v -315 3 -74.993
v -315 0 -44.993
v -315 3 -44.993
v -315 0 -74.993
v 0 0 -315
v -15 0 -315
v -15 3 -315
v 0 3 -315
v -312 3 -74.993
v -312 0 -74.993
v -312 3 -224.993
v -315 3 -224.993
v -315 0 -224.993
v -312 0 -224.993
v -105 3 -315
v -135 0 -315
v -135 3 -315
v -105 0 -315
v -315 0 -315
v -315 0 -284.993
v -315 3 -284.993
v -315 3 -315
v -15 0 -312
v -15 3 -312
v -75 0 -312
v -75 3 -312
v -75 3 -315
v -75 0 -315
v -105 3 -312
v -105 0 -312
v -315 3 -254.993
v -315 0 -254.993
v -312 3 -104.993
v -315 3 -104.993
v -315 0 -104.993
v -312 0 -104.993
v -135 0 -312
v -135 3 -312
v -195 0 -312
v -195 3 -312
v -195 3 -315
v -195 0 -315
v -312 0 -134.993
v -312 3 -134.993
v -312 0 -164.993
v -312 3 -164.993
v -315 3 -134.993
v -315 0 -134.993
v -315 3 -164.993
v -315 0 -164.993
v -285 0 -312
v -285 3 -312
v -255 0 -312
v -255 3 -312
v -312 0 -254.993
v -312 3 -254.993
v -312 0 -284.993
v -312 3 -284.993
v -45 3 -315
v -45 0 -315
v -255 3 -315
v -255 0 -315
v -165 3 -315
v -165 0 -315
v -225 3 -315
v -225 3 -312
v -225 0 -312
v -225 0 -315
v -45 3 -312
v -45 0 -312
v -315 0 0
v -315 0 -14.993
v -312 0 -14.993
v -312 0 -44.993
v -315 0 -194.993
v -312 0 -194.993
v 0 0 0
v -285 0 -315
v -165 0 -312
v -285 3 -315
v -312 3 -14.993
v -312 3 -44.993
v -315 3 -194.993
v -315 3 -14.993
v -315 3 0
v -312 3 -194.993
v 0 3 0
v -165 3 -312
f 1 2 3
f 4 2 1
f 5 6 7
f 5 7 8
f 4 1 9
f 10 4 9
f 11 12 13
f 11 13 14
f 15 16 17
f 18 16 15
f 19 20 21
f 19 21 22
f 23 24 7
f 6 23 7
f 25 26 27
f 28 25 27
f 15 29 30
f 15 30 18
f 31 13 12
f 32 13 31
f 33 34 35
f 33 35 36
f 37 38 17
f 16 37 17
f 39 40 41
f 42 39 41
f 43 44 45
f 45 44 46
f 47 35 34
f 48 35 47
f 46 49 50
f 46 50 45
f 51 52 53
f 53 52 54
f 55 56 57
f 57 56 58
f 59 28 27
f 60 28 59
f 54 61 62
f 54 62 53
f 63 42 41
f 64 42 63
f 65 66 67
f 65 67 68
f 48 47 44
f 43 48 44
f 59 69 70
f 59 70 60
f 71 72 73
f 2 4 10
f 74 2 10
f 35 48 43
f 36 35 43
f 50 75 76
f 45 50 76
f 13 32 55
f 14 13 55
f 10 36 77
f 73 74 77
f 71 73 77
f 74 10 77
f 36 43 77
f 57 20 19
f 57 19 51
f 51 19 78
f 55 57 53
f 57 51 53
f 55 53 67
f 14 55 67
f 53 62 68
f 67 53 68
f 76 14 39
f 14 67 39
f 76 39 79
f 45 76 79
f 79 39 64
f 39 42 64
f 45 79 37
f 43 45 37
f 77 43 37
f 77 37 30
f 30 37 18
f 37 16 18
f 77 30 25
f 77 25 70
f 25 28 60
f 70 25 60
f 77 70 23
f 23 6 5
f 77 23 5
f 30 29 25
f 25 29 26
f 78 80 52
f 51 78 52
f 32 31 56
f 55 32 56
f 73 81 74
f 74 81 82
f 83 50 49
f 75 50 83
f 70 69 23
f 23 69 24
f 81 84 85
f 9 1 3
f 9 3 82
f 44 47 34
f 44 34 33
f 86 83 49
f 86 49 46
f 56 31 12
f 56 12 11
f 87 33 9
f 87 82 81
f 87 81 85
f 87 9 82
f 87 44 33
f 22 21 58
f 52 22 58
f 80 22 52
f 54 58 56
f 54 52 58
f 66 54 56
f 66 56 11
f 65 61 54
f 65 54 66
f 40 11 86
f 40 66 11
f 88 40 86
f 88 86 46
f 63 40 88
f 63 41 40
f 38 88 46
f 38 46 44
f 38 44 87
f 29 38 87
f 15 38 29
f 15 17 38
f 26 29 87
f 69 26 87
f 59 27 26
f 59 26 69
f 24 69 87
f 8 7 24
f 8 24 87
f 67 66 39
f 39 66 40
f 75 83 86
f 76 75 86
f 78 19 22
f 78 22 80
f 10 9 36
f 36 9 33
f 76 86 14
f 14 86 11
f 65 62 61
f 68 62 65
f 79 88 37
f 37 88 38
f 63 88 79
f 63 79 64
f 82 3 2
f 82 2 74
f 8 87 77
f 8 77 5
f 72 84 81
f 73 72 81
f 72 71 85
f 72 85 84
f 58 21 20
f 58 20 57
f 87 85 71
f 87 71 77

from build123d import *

# Parameters (mm, degrees)
SKETCH1_W               = 630
SKETCH1_H               = 630
BOSS_EXTRUDE1_DEPTH     = 3
SKETCH3_W               = 3
SKETCH3_H               = 30
CUT_EXTRUDE2_DEPTH      = 3
LPATTERN2_COUNT         = 10
LPATTERN2_PITCH         = 60
MIRROR1_COPY_1_SKETCH_W = 3
MIRROR1_COPY_1_SKETCH_H = 30
MIRROR1_COPY_1_DEPTH    = 3
MIRROR1_COPY_2_SKETCH_W = 3
MIRROR1_COPY_2_SKETCH_H = 30
MIRROR1_COPY_2_DEPTH    = 3
MIRROR1_COPY_3_SKETCH_W = 3
MIRROR1_COPY_3_SKETCH_H = 30
MIRROR1_COPY_3_DEPTH    = 3
MIRROR1_COPY_4_SKETCH_W = 3
MIRROR1_COPY_4_SKETCH_H = 30
MIRROR1_COPY_4_DEPTH    = 3
MIRROR1_COPY_5_SKETCH_W = 3
MIRROR1_COPY_5_SKETCH_H = 30
MIRROR1_COPY_5_DEPTH    = 3
MIRROR1_COPY_6_SKETCH_W = 3
MIRROR1_COPY_6_SKETCH_H = 30
MIRROR1_COPY_6_DEPTH    = 3
MIRROR1_COPY_7_SKETCH_W = 3
MIRROR1_COPY_7_SKETCH_H = 30
MIRROR1_COPY_7_DEPTH    = 3
MIRROR1_COPY_8_SKETCH_W = 3
MIRROR1_COPY_8_SKETCH_H = 30
MIRROR1_COPY_8_DEPTH    = 3
MIRROR1_COPY_9_SKETCH_W = 3
MIRROR1_COPY_9_SKETCH_H = 30
MIRROR1_COPY_9_DEPTH    = 3
SKETCH5_W               = 30
SKETCH5_H               = 3
CUT_EXTRUDE3_DEPTH      = 3
LPATTERN3_COUNT         = 10
LPATTERN3_PITCH         = 60
MIRROR2_COPY_1_SKETCH_W = 30
MIRROR2_COPY_1_SKETCH_H = 3
MIRROR2_COPY_1_DEPTH    = 3
MIRROR2_COPY_2_SKETCH_W = 30
MIRROR2_COPY_2_SKETCH_H = 3
MIRROR2_COPY_2_DEPTH    = 3
MIRROR2_COPY_3_SKETCH_W = 30
MIRROR2_COPY_3_SKETCH_H = 3
MIRROR2_COPY_3_DEPTH    = 3
MIRROR2_COPY_4_SKETCH_W = 30
MIRROR2_COPY_4_SKETCH_H = 3
MIRROR2_COPY_4_DEPTH    = 3
MIRROR2_COPY_5_SKETCH_W = 30
MIRROR2_COPY_5_SKETCH_H = 3
MIRROR2_COPY_5_DEPTH    = 3
MIRROR2_COPY_6_SKETCH_W = 30
MIRROR2_COPY_6_SKETCH_H = 3
MIRROR2_COPY_6_DEPTH    = 3
MIRROR2_COPY_7_SKETCH_W = 30
MIRROR2_COPY_7_SKETCH_H = 3
MIRROR2_COPY_7_DEPTH    = 3
MIRROR2_COPY_8_SKETCH_W = 30
MIRROR2_COPY_8_SKETCH_H = 3
MIRROR2_COPY_8_DEPTH    = 3
MIRROR2_COPY_9_SKETCH_W = 30
MIRROR2_COPY_9_SKETCH_H = 3
MIRROR2_COPY_9_DEPTH    = 3


with BuildPart() as part:
    # Sketch1 → Boss-Extrude1 (new body)
    with BuildSketch(Plane(origin=(0, 0, 0), x_dir=(1, 0, 0), z_dir=(0, 1, 0))):
        Rectangle(SKETCH1_W, SKETCH1_H)
    extrude(amount=BOSS_EXTRUDE1_DEPTH)

    # Sketch3 → Cut-Extrude2 (cut)
    with BuildSketch(Plane(origin=(0, 3, 0), x_dir=(1, 0, 0), z_dir=(0, 1, 0))):
        with Locations((-313.5, -270.006843512)):
            Rectangle(SKETCH3_W, SKETCH3_H)
    cut_extrude2 = extrude(amount=-CUT_EXTRUDE2_DEPTH, mode=Mode.SUBTRACT)

    # LPattern2: Cut-Extrude2 ×10
    with Locations(*[(0, 0, -i * LPATTERN2_PITCH) for i in range(1, LPATTERN2_COUNT)]):
        add(cut_extrude2, mode=Mode.SUBTRACT)

    # Mirror1: Cut-Extrude2 across plane
    add(cut_extrude2.mirror(Plane(origin=(0, 0, 0), x_dir=(0, 0, 1), z_dir=(1, 0, 0))), mode=Mode.SUBTRACT)

    # Mirror1 copy 1 sketch → Mirror1 copy 1 (cut)
    with BuildSketch(Plane(origin=(0, 3, -60), x_dir=(-1, 0, 0), z_dir=(0, 1, 0))):
        with Locations((-313.5, 270.006843512)):
            Rectangle(MIRROR1_COPY_1_SKETCH_W, MIRROR1_COPY_1_SKETCH_H)
    extrude(amount=-MIRROR1_COPY_1_DEPTH, mode=Mode.SUBTRACT)

    # Mirror1 copy 2 sketch → Mirror1 copy 2 (cut)
    with BuildSketch(Plane(origin=(0, 3, -120), x_dir=(-1, 0, 0), z_dir=(0, 1, 0))):
        with Locations((-313.5, 270.006843512)):
            Rectangle(MIRROR1_COPY_2_SKETCH_W, MIRROR1_COPY_2_SKETCH_H)
    extrude(amount=-MIRROR1_COPY_2_DEPTH, mode=Mode.SUBTRACT)

    # Mirror1 copy 3 sketch → Mirror1 copy 3 (cut)
    with BuildSketch(Plane(origin=(0, 3, -180), x_dir=(-1, 0, 0), z_dir=(0, 1, 0))):
        with Locations((-313.5, 270.006843512)):
            Rectangle(MIRROR1_COPY_3_SKETCH_W, MIRROR1_COPY_3_SKETCH_H)
    extrude(amount=-MIRROR1_COPY_3_DEPTH, mode=Mode.SUBTRACT)

    # Mirror1 copy 4 sketch → Mirror1 copy 4 (cut)
    with BuildSketch(Plane(origin=(0, 3, -240), x_dir=(-1, 0, 0), z_dir=(0, 1, 0))):
        with Locations((-313.5, 270.006843512)):
            Rectangle(MIRROR1_COPY_4_SKETCH_W, MIRROR1_COPY_4_SKETCH_H)
    extrude(amount=-MIRROR1_COPY_4_DEPTH, mode=Mode.SUBTRACT)

    # Mirror1 copy 5 sketch → Mirror1 copy 5 (cut)
    with BuildSketch(Plane(origin=(0, 3, -300), x_dir=(-1, 0, 0), z_dir=(0, 1, 0))):
        with Locations((-313.5, 270.006843512)):
            Rectangle(MIRROR1_COPY_5_SKETCH_W, MIRROR1_COPY_5_SKETCH_H)
    extrude(amount=-MIRROR1_COPY_5_DEPTH, mode=Mode.SUBTRACT)

    # Mirror1 copy 6 sketch → Mirror1 copy 6 (cut)
    with BuildSketch(Plane(origin=(0, 3, -360), x_dir=(-1, 0, 0), z_dir=(0, 1, 0))):
        with Locations((-313.5, 270.006843512)):
            Rectangle(MIRROR1_COPY_6_SKETCH_W, MIRROR1_COPY_6_SKETCH_H)
    extrude(amount=-MIRROR1_COPY_6_DEPTH, mode=Mode.SUBTRACT)

    # Mirror1 copy 7 sketch → Mirror1 copy 7 (cut)
    with BuildSketch(Plane(origin=(0, 3, -420), x_dir=(-1, 0, 0), z_dir=(0, 1, 0))):
        with Locations((-313.5, 270.006843512)):
            Rectangle(MIRROR1_COPY_7_SKETCH_W, MIRROR1_COPY_7_SKETCH_H)
    extrude(amount=-MIRROR1_COPY_7_DEPTH, mode=Mode.SUBTRACT)

    # Mirror1 copy 8 sketch → Mirror1 copy 8 (cut)
    with BuildSketch(Plane(origin=(0, 3, -480), x_dir=(-1, 0, 0), z_dir=(0, 1, 0))):
        with Locations((-313.5, 270.006843512)):
            Rectangle(MIRROR1_COPY_8_SKETCH_W, MIRROR1_COPY_8_SKETCH_H)
    extrude(amount=-MIRROR1_COPY_8_DEPTH, mode=Mode.SUBTRACT)

    # Mirror1 copy 9 sketch → Mirror1 copy 9 (cut)
    with BuildSketch(Plane(origin=(0, 3, -540), x_dir=(-1, 0, 0), z_dir=(0, 1, 0))):
        with Locations((-313.5, 270.006843512)):
            Rectangle(MIRROR1_COPY_9_SKETCH_W, MIRROR1_COPY_9_SKETCH_H)
    extrude(amount=-MIRROR1_COPY_9_DEPTH, mode=Mode.SUBTRACT)

    # Sketch5 → Cut-Extrude3 (cut)
    with BuildSketch(Plane(origin=(0, 3, 0), x_dir=(1, 0, 0), z_dir=(0, 1, 0))):
        with Locations((-270.000314512, -313.5)):
            Rectangle(SKETCH5_W, SKETCH5_H)
    cut_extrude3 = extrude(amount=-CUT_EXTRUDE3_DEPTH, mode=Mode.SUBTRACT)

    # LPattern3: Cut-Extrude3 ×10
    with Locations(*[(i * LPATTERN3_PITCH, 0, 0) for i in range(1, LPATTERN3_COUNT)]):
        add(cut_extrude3, mode=Mode.SUBTRACT)

    # Mirror2: Cut-Extrude3 across plane
    add(cut_extrude3.mirror(Plane.XY), mode=Mode.SUBTRACT)

    # Mirror2 copy 1 sketch → Mirror2 copy 1 (cut)
    with BuildSketch(Plane(origin=(60, 3, 0), x_dir=(1, 0, 0), z_dir=(0, 1, 0))):
        with Locations((-270.000314512, 313.5)):
            Rectangle(MIRROR2_COPY_1_SKETCH_W, MIRROR2_COPY_1_SKETCH_H)
    extrude(amount=-MIRROR2_COPY_1_DEPTH, mode=Mode.SUBTRACT)

    # Mirror2 copy 2 sketch → Mirror2 copy 2 (cut)
    with BuildSketch(Plane(origin=(120, 3, 0), x_dir=(1, 0, 0), z_dir=(0, 1, 0))):
        with Locations((-270.000314512, 313.5)):
            Rectangle(MIRROR2_COPY_2_SKETCH_W, MIRROR2_COPY_2_SKETCH_H)
    extrude(amount=-MIRROR2_COPY_2_DEPTH, mode=Mode.SUBTRACT)

    # Mirror2 copy 3 sketch → Mirror2 copy 3 (cut)
    with BuildSketch(Plane(origin=(180, 3, 0), x_dir=(1, 0, 0), z_dir=(0, 1, 0))):
        with Locations((-270.000314512, 313.5)):
            Rectangle(MIRROR2_COPY_3_SKETCH_W, MIRROR2_COPY_3_SKETCH_H)
    extrude(amount=-MIRROR2_COPY_3_DEPTH, mode=Mode.SUBTRACT)

    # Mirror2 copy 4 sketch → Mirror2 copy 4 (cut)
    with BuildSketch(Plane(origin=(240, 3, 0), x_dir=(1, 0, 0), z_dir=(0, 1, 0))):
        with Locations((-270.000314512, 313.5)):
            Rectangle(MIRROR2_COPY_4_SKETCH_W, MIRROR2_COPY_4_SKETCH_H)
    extrude(amount=-MIRROR2_COPY_4_DEPTH, mode=Mode.SUBTRACT)

    # Mirror2 copy 5 sketch → Mirror2 copy 5 (cut)
    with BuildSketch(Plane(origin=(300, 3, 0), x_dir=(1, 0, 0), z_dir=(0, 1, 0))):
        with Locations((-270.000314512, 313.5)):
            Rectangle(MIRROR2_COPY_5_SKETCH_W, MIRROR2_COPY_5_SKETCH_H)
    extrude(amount=-MIRROR2_COPY_5_DEPTH, mode=Mode.SUBTRACT)

    # Mirror2 copy 6 sketch → Mirror2 copy 6 (cut)
    with BuildSketch(Plane(origin=(360, 3, 0), x_dir=(1, 0, 0), z_dir=(0, 1, 0))):
        with Locations((-270.000314512, 313.5)):
            Rectangle(MIRROR2_COPY_6_SKETCH_W, MIRROR2_COPY_6_SKETCH_H)
    extrude(amount=-MIRROR2_COPY_6_DEPTH, mode=Mode.SUBTRACT)

    # Mirror2 copy 7 sketch → Mirror2 copy 7 (cut)
    with BuildSketch(Plane(origin=(420, 3, 0), x_dir=(1, 0, 0), z_dir=(0, 1, 0))):
        with Locations((-270.000314512, 313.5)):
            Rectangle(MIRROR2_COPY_7_SKETCH_W, MIRROR2_COPY_7_SKETCH_H)
    extrude(amount=-MIRROR2_COPY_7_DEPTH, mode=Mode.SUBTRACT)

    # Mirror2 copy 8 sketch → Mirror2 copy 8 (cut)
    with BuildSketch(Plane(origin=(480, 3, 0), x_dir=(1, 0, 0), z_dir=(0, 1, 0))):
        with Locations((-270.000314512, 313.5)):
            Rectangle(MIRROR2_COPY_8_SKETCH_W, MIRROR2_COPY_8_SKETCH_H)
    extrude(amount=-MIRROR2_COPY_8_DEPTH, mode=Mode.SUBTRACT)

    # Mirror2 copy 9 sketch → Mirror2 copy 9 (cut)
    with BuildSketch(Plane(origin=(540, 3, 0), x_dir=(1, 0, 0), z_dir=(0, 1, 0))):
        with Locations((-270.000314512, 313.5)):
            Rectangle(MIRROR2_COPY_9_SKETCH_W, MIRROR2_COPY_9_SKETCH_H)
    extrude(amount=-MIRROR2_COPY_9_DEPTH, mode=Mode.SUBTRACT)

    # SurfaceCut1
    split(bisect_by=Plane.XY, keep=Keep.BOTTOM)

    # SurfaceCut2
    split(bisect_by=Plane(origin=(0, 0, 0), x_dir=(0, 0, -1), z_dir=(1, 0, 0)), keep=Keep.BOTTOM)


solid = part.part
